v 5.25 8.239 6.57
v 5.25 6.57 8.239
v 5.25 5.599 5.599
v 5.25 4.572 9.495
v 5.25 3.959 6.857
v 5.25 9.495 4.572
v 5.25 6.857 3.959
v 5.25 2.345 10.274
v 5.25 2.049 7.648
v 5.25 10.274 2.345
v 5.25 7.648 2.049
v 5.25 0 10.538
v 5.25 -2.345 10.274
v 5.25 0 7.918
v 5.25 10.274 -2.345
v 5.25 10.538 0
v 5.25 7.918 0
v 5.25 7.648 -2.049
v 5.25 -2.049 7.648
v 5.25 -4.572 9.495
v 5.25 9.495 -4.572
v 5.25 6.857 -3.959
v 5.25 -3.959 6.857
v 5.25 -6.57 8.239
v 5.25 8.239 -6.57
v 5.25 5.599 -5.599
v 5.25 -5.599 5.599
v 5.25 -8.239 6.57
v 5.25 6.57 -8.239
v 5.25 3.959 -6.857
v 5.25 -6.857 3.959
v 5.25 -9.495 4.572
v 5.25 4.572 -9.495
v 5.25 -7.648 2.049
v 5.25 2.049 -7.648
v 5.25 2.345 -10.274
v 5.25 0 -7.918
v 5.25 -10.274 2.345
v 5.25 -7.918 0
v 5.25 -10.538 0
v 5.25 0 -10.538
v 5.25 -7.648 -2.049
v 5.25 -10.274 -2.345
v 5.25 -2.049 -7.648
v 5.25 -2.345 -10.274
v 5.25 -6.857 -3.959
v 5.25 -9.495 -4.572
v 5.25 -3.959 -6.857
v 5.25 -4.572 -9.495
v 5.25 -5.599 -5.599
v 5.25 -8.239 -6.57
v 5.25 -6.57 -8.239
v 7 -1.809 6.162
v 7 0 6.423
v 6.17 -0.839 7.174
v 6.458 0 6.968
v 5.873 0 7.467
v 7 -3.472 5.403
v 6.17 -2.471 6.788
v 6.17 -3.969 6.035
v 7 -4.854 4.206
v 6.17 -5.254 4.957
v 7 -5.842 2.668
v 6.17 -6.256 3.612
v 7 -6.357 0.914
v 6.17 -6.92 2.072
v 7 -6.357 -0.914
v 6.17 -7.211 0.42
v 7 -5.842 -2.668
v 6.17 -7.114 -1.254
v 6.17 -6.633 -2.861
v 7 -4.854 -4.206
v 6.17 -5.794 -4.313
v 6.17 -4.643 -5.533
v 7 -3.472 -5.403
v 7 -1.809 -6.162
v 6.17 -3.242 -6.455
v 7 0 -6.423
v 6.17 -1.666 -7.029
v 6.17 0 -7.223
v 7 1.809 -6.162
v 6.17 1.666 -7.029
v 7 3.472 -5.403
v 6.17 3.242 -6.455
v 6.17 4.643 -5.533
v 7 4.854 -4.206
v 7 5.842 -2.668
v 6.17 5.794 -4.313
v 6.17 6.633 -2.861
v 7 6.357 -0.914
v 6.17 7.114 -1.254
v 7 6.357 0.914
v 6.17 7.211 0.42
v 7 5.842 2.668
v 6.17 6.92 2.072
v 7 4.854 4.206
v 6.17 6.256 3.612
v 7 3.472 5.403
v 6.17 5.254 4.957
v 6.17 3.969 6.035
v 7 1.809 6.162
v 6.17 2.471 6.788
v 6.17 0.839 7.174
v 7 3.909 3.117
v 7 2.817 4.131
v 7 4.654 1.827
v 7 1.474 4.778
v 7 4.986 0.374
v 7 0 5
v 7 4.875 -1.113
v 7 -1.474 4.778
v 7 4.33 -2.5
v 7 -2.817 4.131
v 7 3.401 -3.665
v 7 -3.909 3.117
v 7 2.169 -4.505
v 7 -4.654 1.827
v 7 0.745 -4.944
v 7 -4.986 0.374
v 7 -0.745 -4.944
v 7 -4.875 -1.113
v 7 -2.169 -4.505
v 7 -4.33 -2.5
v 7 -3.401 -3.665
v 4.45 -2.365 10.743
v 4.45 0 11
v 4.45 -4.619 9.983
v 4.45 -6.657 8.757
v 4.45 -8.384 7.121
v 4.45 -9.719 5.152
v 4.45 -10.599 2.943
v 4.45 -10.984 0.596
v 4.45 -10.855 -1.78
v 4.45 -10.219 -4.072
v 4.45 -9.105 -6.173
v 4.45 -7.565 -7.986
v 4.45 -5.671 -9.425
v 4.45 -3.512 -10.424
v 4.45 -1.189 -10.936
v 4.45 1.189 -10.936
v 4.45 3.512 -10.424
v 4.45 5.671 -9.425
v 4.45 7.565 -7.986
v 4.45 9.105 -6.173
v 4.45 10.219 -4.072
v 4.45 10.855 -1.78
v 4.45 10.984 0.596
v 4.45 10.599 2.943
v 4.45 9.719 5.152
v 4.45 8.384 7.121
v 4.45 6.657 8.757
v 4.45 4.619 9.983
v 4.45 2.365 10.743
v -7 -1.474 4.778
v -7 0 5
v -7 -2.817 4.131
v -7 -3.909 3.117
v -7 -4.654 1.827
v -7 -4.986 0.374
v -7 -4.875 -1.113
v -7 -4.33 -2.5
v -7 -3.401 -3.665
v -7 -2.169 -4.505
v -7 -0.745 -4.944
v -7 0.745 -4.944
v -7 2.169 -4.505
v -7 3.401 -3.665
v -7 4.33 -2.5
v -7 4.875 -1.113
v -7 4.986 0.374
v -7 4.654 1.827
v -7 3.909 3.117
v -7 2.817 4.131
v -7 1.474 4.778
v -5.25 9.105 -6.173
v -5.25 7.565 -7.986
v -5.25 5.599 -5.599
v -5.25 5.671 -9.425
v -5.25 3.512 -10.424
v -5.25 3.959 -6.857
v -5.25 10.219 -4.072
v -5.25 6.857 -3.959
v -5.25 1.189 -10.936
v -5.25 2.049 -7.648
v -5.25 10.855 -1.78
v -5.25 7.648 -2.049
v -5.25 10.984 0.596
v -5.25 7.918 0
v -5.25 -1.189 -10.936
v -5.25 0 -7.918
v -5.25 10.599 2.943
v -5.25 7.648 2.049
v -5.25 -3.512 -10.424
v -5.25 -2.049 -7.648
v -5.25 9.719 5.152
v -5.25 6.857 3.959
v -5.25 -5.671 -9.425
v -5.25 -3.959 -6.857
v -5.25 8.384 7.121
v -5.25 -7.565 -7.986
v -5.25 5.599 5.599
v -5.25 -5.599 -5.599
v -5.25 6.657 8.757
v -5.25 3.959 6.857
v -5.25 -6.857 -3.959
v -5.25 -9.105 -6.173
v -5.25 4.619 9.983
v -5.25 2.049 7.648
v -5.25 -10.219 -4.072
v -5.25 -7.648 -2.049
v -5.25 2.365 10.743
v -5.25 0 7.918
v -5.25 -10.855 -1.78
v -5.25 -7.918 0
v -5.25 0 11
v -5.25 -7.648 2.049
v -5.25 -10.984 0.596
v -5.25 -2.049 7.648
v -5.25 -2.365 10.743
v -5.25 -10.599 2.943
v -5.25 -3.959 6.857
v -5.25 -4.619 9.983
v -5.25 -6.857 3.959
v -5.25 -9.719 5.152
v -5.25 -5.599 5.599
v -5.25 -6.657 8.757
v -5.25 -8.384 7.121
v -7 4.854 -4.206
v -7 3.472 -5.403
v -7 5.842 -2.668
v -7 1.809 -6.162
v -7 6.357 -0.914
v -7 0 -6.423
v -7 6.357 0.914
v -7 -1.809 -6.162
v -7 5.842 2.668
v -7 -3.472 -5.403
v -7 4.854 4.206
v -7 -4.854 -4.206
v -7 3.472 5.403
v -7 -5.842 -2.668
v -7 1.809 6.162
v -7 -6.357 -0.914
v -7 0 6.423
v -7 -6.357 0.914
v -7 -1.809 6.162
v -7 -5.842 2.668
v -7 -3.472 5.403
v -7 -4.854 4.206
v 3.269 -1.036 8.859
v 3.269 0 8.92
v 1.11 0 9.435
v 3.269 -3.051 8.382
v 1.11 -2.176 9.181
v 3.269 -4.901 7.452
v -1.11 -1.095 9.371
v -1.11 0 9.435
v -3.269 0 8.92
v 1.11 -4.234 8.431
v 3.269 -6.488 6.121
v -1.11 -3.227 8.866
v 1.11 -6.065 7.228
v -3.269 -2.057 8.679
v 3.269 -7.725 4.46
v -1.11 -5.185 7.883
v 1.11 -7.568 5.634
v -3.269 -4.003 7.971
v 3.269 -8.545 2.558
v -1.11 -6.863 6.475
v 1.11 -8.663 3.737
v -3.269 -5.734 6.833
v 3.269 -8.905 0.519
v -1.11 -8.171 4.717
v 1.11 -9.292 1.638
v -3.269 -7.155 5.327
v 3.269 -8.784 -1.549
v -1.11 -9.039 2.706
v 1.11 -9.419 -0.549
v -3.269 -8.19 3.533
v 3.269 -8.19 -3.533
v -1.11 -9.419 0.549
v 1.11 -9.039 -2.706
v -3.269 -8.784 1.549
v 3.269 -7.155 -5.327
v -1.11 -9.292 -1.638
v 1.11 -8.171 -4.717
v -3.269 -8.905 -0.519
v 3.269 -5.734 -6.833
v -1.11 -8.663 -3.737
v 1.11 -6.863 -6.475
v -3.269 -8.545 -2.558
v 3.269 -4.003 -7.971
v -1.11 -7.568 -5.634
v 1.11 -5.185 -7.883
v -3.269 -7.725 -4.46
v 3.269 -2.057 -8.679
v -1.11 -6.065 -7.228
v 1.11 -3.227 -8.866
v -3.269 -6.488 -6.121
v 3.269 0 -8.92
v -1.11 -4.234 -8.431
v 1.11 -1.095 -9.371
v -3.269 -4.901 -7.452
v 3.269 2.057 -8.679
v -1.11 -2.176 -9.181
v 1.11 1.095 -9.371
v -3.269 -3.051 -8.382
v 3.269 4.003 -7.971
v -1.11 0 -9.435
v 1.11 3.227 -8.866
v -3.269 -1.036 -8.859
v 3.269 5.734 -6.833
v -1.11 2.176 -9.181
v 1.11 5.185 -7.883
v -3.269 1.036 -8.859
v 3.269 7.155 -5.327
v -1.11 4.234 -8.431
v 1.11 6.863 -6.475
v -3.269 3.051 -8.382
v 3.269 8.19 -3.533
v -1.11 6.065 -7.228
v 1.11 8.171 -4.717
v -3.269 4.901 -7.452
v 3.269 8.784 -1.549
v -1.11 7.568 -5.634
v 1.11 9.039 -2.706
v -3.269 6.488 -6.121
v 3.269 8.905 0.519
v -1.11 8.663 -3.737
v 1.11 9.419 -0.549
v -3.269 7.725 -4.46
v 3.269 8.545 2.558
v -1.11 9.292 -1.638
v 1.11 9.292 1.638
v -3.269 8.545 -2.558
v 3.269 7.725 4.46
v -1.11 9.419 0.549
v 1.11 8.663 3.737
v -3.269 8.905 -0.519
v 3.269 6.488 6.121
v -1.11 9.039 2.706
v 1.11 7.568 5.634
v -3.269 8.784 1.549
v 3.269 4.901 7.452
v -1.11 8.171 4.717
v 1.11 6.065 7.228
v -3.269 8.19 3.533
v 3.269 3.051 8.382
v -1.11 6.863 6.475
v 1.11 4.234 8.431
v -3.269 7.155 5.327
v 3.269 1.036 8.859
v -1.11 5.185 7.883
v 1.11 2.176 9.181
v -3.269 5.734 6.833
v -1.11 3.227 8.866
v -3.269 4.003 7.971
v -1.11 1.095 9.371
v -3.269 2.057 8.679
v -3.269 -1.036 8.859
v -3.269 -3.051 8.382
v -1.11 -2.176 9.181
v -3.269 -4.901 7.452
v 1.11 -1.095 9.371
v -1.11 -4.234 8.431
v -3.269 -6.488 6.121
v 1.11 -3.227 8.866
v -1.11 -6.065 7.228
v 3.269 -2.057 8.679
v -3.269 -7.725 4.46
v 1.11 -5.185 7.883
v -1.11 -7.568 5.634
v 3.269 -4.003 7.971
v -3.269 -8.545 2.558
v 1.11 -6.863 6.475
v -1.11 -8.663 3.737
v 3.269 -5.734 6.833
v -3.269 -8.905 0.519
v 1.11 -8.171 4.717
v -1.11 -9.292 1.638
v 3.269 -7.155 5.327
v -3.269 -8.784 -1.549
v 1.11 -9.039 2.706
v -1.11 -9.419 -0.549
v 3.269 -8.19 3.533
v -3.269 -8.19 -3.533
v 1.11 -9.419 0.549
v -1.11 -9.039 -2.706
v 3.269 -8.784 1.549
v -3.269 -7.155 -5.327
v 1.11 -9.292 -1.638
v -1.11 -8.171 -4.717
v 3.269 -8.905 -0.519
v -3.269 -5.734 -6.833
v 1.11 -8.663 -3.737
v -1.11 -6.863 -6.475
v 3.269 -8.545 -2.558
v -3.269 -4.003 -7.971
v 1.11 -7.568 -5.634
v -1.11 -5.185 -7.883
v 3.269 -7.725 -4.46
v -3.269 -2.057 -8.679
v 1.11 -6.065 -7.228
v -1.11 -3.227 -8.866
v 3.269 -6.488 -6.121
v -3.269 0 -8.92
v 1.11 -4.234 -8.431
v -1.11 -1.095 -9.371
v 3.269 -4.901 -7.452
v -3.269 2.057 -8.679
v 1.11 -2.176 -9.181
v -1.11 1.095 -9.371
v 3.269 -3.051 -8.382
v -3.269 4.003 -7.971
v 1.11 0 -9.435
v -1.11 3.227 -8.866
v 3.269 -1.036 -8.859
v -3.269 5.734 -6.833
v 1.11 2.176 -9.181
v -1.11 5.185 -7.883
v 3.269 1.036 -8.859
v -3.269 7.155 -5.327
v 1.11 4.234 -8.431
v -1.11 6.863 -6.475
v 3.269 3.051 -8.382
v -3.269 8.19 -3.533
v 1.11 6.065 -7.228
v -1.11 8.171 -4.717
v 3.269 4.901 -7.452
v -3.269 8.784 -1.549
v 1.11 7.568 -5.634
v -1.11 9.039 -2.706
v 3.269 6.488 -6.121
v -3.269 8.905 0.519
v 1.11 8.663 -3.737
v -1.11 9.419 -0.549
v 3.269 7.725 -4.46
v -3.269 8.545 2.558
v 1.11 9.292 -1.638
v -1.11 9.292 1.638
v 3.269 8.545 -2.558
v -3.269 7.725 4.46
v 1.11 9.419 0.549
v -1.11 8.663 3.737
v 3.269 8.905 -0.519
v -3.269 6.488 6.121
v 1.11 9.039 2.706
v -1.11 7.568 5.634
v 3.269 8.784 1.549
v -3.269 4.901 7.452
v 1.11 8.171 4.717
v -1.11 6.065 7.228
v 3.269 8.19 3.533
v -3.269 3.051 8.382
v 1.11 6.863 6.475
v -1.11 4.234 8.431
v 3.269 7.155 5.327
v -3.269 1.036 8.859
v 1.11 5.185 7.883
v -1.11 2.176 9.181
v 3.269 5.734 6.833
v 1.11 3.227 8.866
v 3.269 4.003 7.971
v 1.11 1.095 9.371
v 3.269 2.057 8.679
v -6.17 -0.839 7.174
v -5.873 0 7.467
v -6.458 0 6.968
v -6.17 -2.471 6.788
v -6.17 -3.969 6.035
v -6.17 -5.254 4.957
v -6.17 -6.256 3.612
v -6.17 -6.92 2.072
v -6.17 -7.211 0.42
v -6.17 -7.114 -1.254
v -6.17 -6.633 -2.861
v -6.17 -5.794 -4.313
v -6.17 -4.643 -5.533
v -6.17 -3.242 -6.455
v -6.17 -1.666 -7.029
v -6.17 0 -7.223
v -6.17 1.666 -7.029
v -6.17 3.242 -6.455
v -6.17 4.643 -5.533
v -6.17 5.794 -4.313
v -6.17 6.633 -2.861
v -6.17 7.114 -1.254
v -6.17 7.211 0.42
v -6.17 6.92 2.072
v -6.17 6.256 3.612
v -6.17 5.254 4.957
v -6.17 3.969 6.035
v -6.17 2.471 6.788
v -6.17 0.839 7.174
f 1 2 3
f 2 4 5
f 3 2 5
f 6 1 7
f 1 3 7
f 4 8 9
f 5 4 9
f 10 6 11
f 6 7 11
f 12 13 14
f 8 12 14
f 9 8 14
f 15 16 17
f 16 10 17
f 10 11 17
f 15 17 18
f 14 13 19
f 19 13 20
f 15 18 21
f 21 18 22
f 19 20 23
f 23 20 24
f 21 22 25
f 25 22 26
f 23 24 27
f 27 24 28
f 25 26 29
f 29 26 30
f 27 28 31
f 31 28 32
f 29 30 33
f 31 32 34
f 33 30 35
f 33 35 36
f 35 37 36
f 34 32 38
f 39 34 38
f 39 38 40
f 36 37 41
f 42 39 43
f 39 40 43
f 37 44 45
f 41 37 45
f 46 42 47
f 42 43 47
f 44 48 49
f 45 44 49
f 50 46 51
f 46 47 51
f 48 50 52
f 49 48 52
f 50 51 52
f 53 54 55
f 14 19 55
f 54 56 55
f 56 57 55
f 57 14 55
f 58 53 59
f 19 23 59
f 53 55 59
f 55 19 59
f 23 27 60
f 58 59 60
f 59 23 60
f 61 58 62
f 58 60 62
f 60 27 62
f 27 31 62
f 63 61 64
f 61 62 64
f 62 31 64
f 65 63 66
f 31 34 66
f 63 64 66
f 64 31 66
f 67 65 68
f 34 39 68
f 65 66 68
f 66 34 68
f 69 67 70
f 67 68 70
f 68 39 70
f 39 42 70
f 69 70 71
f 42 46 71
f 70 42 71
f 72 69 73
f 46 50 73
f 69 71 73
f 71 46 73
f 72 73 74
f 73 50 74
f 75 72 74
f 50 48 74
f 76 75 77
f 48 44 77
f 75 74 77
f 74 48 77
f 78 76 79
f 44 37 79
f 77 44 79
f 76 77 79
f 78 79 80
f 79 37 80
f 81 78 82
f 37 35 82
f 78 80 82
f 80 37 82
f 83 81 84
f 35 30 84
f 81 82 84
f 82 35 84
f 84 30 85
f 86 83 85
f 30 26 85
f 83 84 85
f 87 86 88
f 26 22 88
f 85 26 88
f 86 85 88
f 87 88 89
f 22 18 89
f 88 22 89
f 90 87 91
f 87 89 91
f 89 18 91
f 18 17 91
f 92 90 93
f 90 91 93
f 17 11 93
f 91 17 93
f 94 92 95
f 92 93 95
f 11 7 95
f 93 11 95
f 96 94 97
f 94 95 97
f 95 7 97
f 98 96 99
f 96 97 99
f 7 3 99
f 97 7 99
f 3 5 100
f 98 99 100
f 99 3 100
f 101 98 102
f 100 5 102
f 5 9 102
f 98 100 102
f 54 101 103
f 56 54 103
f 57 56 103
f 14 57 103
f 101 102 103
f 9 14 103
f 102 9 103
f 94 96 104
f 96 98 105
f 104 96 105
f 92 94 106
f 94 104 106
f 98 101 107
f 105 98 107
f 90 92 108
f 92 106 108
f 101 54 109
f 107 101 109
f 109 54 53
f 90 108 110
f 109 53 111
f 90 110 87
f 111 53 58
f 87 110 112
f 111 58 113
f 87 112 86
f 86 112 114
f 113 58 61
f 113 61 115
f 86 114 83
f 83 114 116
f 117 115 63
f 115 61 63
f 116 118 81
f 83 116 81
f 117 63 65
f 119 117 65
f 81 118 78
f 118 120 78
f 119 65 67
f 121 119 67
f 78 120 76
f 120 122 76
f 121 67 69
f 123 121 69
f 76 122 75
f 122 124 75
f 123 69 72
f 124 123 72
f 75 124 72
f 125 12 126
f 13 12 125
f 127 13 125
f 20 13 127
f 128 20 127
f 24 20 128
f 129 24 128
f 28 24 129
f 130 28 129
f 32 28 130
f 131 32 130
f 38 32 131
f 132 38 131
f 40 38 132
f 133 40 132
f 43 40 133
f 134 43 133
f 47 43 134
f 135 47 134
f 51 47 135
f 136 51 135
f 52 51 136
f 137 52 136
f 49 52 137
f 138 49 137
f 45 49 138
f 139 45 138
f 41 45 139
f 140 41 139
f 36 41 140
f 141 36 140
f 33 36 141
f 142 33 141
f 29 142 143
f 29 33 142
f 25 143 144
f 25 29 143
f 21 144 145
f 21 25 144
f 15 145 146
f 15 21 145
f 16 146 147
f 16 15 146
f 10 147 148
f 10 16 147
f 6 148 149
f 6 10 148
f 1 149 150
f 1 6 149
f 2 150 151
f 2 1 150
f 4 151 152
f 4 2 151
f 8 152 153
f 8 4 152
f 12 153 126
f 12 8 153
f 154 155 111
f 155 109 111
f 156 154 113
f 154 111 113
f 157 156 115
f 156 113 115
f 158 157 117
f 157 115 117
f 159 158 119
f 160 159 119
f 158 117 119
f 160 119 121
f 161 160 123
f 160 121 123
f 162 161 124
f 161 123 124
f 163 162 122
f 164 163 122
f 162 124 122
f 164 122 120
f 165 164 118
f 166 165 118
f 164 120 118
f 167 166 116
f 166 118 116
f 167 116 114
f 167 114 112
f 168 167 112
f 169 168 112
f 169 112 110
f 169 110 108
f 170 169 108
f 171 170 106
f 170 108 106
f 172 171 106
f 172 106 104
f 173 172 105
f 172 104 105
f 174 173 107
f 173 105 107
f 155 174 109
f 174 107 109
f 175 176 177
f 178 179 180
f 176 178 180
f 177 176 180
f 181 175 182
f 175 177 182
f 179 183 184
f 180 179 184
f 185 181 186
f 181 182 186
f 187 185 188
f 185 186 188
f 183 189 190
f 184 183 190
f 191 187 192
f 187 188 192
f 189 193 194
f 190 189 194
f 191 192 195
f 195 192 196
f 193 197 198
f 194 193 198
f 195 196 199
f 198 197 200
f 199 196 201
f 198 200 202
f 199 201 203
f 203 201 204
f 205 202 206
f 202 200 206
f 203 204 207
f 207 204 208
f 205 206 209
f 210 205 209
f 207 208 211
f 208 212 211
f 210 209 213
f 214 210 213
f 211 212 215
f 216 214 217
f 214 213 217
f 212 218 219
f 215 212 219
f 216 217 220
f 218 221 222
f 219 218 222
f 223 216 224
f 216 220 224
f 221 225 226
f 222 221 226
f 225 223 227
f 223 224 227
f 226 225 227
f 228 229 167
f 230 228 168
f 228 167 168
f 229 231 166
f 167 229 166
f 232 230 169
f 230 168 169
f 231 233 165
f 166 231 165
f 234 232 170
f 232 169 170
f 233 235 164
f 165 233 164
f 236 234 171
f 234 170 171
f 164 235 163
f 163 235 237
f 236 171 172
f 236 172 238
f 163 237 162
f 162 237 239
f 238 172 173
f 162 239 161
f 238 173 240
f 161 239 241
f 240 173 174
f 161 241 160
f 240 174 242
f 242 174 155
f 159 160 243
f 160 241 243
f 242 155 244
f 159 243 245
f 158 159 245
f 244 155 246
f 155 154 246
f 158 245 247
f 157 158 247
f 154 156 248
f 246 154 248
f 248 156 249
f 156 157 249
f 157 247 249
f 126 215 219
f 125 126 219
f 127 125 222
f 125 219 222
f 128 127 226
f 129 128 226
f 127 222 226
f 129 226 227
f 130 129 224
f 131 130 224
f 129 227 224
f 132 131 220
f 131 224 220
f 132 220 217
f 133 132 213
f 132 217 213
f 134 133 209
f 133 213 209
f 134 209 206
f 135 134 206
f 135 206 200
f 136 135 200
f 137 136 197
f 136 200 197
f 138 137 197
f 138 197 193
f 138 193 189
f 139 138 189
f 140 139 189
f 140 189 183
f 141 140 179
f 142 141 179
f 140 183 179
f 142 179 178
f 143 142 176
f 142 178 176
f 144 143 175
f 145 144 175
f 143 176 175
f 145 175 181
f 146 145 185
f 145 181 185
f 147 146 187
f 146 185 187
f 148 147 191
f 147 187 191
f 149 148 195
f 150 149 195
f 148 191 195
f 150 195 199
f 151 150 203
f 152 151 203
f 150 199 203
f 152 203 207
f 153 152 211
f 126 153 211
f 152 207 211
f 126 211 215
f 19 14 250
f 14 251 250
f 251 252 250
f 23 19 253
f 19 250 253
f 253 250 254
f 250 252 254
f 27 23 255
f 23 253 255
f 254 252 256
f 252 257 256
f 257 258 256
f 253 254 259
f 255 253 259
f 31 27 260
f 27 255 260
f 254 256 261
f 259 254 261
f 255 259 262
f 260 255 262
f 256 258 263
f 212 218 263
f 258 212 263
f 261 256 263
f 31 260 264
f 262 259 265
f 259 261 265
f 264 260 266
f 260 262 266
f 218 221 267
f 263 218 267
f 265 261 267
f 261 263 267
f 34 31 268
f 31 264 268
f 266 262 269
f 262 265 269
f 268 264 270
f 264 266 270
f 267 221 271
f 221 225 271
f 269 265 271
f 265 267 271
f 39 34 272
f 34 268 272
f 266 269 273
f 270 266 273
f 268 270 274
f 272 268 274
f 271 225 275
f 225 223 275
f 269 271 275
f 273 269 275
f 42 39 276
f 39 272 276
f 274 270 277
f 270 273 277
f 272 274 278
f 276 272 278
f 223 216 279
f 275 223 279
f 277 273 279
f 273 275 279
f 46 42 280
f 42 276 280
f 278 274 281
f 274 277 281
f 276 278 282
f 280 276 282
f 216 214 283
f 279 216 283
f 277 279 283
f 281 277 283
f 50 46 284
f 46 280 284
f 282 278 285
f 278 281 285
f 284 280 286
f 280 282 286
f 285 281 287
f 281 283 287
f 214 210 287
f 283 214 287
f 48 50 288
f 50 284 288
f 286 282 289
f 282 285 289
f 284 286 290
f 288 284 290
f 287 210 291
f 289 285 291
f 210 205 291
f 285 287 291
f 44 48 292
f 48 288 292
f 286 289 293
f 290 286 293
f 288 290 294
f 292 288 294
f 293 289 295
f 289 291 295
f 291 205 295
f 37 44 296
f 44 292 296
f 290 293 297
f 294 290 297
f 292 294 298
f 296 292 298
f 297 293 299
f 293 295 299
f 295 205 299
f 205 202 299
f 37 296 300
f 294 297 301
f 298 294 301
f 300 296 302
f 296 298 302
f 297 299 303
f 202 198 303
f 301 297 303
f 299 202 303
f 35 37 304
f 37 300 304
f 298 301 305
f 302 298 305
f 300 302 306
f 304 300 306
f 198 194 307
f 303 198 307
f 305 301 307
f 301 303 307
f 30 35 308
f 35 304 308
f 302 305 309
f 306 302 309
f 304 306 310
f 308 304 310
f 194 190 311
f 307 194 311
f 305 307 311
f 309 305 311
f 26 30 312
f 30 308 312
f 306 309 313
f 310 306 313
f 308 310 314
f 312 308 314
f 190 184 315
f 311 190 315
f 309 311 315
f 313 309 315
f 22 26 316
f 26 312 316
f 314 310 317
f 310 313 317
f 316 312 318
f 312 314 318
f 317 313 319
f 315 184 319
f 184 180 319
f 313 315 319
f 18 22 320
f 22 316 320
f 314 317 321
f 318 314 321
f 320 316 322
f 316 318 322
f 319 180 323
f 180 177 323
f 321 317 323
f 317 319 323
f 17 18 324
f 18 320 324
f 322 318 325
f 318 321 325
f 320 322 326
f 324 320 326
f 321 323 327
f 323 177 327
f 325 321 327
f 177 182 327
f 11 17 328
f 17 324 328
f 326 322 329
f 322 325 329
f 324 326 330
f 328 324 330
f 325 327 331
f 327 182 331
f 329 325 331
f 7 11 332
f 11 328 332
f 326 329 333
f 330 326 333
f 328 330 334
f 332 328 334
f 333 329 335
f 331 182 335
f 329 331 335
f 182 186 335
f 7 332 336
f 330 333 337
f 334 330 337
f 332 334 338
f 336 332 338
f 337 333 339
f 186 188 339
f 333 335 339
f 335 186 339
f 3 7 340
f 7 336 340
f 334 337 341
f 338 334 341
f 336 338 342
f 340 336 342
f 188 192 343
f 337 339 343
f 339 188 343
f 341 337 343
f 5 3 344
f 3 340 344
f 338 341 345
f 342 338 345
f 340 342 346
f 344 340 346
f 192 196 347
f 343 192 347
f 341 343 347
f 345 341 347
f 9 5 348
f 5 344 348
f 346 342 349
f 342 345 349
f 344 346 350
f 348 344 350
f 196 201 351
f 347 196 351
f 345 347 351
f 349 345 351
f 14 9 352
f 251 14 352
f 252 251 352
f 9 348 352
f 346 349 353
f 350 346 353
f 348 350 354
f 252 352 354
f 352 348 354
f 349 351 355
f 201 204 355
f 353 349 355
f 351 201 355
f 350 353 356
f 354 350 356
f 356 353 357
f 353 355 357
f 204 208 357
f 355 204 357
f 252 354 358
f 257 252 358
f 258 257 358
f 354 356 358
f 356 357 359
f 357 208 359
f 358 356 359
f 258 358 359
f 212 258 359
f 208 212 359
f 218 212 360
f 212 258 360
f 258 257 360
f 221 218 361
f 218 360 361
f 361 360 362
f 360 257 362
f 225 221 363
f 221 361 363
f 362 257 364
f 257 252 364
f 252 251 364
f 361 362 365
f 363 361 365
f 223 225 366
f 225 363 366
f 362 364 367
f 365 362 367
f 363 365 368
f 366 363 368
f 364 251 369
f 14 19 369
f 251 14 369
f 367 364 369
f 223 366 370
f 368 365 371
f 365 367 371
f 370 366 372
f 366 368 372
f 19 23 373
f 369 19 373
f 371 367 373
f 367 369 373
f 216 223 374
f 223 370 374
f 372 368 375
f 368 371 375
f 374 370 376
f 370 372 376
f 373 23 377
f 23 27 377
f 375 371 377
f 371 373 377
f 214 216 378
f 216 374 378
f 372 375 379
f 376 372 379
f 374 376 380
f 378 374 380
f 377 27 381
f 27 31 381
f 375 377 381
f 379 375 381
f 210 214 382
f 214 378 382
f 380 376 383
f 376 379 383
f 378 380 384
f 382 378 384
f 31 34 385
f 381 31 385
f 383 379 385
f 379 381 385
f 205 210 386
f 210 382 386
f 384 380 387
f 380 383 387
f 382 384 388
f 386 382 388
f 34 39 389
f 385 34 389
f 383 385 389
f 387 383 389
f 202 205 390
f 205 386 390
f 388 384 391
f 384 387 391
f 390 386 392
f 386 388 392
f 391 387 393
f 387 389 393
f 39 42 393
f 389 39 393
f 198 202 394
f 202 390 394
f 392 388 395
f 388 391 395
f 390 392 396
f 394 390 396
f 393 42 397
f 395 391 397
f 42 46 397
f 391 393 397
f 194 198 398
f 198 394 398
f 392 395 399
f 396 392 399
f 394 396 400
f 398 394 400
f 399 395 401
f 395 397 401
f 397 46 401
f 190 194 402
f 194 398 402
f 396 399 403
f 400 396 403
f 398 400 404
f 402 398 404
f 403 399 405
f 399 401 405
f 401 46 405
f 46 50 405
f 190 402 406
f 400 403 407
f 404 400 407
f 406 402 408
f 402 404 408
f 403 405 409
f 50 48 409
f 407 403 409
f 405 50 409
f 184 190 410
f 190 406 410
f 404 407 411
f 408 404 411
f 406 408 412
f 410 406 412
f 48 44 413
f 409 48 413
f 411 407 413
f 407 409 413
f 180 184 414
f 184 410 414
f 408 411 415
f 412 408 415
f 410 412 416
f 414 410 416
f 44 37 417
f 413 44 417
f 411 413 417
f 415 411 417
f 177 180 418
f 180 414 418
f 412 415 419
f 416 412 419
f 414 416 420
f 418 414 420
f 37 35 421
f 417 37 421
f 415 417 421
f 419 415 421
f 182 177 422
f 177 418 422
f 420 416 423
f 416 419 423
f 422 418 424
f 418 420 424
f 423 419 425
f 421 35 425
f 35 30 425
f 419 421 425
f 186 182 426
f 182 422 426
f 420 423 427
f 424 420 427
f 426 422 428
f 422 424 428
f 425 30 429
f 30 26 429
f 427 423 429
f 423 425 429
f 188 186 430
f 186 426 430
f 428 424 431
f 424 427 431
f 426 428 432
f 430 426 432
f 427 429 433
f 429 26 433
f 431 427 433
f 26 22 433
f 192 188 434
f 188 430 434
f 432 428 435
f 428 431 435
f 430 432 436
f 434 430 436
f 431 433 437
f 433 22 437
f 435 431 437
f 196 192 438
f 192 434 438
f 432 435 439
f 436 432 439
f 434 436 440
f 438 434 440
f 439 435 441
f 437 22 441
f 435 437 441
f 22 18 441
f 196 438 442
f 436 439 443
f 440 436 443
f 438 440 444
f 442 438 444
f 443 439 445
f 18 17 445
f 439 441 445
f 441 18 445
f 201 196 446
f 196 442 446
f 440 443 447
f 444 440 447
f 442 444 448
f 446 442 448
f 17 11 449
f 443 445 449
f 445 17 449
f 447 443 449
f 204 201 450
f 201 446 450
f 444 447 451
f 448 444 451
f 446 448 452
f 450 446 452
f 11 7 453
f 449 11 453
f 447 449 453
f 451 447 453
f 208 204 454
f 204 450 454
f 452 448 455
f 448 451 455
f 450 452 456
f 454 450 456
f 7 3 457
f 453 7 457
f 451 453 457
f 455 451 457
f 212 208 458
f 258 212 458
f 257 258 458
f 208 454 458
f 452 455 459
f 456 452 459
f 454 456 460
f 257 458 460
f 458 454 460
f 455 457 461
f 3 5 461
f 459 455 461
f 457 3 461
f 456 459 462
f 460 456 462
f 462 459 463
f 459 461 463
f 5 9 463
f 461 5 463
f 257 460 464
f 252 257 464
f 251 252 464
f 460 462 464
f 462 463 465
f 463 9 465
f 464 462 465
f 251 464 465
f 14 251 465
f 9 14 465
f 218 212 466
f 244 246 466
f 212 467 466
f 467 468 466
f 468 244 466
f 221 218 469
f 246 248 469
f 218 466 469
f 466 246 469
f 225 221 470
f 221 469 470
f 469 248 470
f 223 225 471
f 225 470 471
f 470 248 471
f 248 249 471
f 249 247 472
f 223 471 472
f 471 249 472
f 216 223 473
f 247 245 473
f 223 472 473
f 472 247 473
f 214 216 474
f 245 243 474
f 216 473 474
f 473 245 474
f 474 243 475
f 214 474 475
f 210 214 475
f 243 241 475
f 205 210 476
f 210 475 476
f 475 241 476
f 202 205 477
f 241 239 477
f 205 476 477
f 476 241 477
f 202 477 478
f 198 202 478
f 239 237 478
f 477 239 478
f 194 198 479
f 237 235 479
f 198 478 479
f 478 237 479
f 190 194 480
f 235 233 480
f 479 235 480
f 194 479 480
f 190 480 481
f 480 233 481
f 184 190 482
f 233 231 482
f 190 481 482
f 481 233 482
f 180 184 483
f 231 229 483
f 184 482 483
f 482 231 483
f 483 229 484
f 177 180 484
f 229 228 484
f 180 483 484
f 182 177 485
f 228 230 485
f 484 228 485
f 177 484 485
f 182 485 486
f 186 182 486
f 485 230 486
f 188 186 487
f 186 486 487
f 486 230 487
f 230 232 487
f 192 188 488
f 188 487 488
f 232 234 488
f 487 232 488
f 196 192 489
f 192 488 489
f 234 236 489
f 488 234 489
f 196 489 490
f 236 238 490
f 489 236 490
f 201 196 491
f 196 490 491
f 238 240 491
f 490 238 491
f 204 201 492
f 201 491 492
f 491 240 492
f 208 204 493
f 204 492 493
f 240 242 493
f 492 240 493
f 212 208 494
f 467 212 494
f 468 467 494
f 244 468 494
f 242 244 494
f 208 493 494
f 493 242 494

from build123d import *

# Parameters (mm, degrees)
F3_SIZE2 = 0.4618802154
F3_SIZE  = 0.8


with BuildPart() as f1:
    # F0 (on Front) → F1 (revolve)
    with BuildSketch(Plane.XZ):
        with BuildLine():
            Line((7, 5), (7, 6.4226162893))
            ThreePointArc((7, 6.4226162893), (6.1704397796, 7.2232730065), (5.25, 7.9175438111))
            Line((5.25, 7.9175438111), (5.25, 5))
            Line((5.25, 5), (7, 5))
        make_face()
        with BuildLine():
            Line((5.25, 5), (5.25, 7.9175438111))
            ThreePointArc((5.25, 7.9175438111), (0, 9.5), (-5.25, 7.9175438111))
            Line((-5.25, 7.9175438111), (-5.25, 5))
            Line((-5.25, 5), (5.25, 5))
        make_face()
        with BuildLine():
            Line((-5.25, 5), (-5.25, 7.9175438111))
            ThreePointArc((-5.25, 7.9175438111), (-6.1704397796, 7.2232730065), (-7, 6.4226162893))
            Line((-7, 6.4226162893), (-7, 5))
            Line((-7, 5), (-5.25, 5))
        make_face()
    revolve(axis=Axis((-1.1205514893, 0, 0), (1, 0, 0)))


with BuildPart() as f2:
    # F0 (on Front) → F2 (revolve)
    with BuildSketch(Plane.XZ):
        with BuildLine():
            ThreePointArc((-5.25, 7.9175438111), (0, 9.5), (5.25, 7.9175438111))
            Line((5.25, 7.9175438111), (5.25, 11))
            Line((5.25, 11), (-5.25, 11))
            Line((-5.25, 11), (-5.25, 7.9175438111))
        make_face()
    revolve(axis=Axis((-1.1205514893, 0, 0), (1, 0, 0)))

    # F3
    f3_edges = [f2.edges().sort_by_distance(p)[0] for p in [
        (5.25, 0, -11),
    ]]
    f3_side = f2.faces().sort_by_distance((0, 0, -11))[0]
    chamfer(f3_edges, length=F3_SIZE, length2=F3_SIZE2, reference=f3_side)


solid = Compound([f1.part, f2.part])
